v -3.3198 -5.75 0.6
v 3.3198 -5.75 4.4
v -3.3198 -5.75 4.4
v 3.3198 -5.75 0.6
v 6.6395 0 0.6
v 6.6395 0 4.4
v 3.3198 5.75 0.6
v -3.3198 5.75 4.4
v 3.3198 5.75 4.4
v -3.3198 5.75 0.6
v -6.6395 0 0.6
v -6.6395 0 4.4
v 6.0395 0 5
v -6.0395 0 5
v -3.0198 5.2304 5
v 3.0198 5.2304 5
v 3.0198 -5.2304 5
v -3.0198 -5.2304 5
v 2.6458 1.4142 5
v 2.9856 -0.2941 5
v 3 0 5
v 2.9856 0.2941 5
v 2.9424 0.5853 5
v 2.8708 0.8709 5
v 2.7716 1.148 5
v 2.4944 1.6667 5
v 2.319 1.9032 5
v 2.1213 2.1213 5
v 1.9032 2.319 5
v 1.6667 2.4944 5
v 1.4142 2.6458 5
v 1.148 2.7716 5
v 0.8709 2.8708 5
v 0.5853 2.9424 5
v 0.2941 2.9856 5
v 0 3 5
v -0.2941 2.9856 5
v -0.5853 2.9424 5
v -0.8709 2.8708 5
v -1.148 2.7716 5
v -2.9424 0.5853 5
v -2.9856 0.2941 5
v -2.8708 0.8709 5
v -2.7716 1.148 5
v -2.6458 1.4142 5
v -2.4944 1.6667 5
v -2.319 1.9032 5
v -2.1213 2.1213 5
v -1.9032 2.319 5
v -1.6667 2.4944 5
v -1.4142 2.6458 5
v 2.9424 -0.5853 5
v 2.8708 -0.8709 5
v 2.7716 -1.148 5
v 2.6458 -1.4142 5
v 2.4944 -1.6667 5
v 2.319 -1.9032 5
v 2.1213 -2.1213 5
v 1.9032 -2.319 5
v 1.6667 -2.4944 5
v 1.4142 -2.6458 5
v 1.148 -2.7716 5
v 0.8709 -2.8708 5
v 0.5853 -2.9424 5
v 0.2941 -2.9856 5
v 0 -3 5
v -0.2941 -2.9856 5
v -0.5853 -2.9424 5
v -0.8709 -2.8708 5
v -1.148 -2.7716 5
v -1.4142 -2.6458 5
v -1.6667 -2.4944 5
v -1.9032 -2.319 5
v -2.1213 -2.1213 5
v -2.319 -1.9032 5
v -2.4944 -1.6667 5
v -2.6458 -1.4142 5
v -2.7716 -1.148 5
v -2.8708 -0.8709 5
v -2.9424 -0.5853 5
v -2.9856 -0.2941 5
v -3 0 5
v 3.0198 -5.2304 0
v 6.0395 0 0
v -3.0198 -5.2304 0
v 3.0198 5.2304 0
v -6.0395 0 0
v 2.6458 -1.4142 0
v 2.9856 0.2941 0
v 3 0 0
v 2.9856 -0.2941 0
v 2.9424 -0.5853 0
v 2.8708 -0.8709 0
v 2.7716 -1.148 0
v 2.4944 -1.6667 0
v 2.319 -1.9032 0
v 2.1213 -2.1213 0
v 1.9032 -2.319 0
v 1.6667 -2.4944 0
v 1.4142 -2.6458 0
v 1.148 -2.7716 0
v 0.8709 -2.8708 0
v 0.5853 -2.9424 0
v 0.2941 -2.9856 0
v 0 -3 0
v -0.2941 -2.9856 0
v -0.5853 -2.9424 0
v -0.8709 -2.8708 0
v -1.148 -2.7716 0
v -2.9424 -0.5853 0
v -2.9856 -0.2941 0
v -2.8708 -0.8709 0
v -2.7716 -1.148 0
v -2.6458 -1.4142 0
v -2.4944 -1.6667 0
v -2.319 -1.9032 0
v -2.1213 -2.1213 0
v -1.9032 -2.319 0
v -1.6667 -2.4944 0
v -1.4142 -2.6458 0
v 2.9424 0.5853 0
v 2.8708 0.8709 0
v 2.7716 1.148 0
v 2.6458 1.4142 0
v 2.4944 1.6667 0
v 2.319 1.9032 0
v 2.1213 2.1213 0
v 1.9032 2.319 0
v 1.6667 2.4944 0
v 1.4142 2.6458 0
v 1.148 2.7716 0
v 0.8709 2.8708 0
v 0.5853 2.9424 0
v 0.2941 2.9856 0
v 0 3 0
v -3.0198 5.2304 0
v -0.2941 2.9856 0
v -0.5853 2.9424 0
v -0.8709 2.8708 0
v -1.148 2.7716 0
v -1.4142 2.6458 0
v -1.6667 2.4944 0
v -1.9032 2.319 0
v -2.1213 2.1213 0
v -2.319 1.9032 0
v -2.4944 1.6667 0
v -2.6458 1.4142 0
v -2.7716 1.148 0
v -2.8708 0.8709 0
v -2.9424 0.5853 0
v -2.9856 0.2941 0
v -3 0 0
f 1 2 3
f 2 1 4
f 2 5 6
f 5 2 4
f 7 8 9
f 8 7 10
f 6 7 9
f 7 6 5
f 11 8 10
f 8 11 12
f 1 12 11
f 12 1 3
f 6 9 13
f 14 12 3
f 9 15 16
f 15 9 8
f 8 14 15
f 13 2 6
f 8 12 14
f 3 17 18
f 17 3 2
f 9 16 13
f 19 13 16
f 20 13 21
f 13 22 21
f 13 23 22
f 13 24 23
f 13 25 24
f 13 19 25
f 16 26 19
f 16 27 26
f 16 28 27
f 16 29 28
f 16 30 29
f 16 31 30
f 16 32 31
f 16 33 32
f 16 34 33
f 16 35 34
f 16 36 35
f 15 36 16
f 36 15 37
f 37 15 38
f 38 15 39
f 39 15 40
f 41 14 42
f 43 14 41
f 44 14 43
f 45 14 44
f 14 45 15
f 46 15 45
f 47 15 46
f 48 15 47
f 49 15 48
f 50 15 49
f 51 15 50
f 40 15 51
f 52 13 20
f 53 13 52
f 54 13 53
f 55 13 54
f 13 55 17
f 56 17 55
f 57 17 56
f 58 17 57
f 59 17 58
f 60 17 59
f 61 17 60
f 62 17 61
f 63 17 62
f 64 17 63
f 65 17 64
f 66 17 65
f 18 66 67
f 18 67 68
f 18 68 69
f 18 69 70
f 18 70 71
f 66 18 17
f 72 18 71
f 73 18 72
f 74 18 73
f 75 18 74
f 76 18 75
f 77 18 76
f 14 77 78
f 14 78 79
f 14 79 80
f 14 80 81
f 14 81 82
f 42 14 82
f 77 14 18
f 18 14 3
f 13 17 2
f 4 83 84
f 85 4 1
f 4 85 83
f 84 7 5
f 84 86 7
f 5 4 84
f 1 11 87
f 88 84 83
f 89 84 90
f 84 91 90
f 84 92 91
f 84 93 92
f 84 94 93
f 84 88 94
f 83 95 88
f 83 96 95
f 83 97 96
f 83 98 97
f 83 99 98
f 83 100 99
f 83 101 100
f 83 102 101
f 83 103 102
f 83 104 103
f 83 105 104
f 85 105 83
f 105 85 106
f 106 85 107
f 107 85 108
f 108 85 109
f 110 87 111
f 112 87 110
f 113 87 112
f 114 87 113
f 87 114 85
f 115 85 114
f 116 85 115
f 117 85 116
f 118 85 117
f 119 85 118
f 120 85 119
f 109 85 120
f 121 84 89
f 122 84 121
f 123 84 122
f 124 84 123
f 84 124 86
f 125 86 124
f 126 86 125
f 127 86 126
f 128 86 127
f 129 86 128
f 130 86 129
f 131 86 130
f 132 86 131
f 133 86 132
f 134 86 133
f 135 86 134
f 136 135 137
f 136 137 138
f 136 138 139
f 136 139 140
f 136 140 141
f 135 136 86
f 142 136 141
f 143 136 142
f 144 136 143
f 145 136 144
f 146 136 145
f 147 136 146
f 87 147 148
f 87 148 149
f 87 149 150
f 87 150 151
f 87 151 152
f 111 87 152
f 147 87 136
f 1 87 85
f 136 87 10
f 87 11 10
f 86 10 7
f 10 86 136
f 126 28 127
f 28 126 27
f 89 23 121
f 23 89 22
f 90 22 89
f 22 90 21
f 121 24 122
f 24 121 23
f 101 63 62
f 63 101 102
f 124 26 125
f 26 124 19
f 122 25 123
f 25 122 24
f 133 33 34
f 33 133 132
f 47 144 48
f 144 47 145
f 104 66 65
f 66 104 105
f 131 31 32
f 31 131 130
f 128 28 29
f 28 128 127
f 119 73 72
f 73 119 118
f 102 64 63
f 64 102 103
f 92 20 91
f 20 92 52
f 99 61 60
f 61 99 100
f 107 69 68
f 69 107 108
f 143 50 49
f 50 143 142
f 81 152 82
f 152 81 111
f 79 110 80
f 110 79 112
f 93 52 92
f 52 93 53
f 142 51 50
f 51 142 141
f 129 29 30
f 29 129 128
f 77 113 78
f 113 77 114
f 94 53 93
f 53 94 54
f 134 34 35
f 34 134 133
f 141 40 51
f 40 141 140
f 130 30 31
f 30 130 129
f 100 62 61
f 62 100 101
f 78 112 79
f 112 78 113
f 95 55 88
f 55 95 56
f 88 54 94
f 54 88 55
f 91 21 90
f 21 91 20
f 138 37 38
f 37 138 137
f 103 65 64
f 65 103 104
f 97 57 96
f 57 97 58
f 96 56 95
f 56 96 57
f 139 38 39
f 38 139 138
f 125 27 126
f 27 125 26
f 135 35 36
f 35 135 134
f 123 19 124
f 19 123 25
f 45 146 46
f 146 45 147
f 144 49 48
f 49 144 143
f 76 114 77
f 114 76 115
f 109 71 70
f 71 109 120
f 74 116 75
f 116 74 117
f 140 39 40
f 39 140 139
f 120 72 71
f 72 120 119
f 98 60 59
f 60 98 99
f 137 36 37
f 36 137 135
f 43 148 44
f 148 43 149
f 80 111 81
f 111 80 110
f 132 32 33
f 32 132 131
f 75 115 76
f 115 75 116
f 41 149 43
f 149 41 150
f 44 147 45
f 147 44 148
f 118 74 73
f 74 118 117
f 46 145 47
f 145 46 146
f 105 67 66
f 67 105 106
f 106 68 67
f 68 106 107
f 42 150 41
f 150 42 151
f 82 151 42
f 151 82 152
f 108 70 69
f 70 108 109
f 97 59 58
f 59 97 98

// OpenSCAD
// Hex nut: 6.0mm screw, 11.5mm across flats, 5.0mm thick

af = 11.5;          // across flats (mm)
thk = 5.0;          // thickness (mm)
hole_d = 6.0;       // through-hole diameter (mm) for 6.0mm screw
chamfer = 0.6;      // edge chamfer height (mm)
eps = 0.02;

function r_from_af(af) = af / (2 * cos(30));  // circumradius for $fn=6

module hex_nut() {
    R = r_from_af(af);

    difference() {
        // One connected solid: hex body with top/bottom chamfers
        union() {
            // Middle straight section
            translate([0, 0, chamfer])
                cylinder(h = thk - 2*chamfer, r = R, $fn = 6);

            // Top chamfer (tapers inward)
            translate([0, 0, thk - chamfer])
                cylinder(h = chamfer, r1 = R, r2 = R - chamfer, $fn = 6);

            // Bottom chamfer (tapers inward)
            cylinder(h = chamfer, r1 = R - chamfer, r2 = R, $fn = 6);
        }

        // Central through-hole (fully cuts through with margin)
        translate([0, 0, -eps])
            cylinder(h = thk + 2*eps, d = hole_d, $fn = 64);
    }
}

hex_nut();
